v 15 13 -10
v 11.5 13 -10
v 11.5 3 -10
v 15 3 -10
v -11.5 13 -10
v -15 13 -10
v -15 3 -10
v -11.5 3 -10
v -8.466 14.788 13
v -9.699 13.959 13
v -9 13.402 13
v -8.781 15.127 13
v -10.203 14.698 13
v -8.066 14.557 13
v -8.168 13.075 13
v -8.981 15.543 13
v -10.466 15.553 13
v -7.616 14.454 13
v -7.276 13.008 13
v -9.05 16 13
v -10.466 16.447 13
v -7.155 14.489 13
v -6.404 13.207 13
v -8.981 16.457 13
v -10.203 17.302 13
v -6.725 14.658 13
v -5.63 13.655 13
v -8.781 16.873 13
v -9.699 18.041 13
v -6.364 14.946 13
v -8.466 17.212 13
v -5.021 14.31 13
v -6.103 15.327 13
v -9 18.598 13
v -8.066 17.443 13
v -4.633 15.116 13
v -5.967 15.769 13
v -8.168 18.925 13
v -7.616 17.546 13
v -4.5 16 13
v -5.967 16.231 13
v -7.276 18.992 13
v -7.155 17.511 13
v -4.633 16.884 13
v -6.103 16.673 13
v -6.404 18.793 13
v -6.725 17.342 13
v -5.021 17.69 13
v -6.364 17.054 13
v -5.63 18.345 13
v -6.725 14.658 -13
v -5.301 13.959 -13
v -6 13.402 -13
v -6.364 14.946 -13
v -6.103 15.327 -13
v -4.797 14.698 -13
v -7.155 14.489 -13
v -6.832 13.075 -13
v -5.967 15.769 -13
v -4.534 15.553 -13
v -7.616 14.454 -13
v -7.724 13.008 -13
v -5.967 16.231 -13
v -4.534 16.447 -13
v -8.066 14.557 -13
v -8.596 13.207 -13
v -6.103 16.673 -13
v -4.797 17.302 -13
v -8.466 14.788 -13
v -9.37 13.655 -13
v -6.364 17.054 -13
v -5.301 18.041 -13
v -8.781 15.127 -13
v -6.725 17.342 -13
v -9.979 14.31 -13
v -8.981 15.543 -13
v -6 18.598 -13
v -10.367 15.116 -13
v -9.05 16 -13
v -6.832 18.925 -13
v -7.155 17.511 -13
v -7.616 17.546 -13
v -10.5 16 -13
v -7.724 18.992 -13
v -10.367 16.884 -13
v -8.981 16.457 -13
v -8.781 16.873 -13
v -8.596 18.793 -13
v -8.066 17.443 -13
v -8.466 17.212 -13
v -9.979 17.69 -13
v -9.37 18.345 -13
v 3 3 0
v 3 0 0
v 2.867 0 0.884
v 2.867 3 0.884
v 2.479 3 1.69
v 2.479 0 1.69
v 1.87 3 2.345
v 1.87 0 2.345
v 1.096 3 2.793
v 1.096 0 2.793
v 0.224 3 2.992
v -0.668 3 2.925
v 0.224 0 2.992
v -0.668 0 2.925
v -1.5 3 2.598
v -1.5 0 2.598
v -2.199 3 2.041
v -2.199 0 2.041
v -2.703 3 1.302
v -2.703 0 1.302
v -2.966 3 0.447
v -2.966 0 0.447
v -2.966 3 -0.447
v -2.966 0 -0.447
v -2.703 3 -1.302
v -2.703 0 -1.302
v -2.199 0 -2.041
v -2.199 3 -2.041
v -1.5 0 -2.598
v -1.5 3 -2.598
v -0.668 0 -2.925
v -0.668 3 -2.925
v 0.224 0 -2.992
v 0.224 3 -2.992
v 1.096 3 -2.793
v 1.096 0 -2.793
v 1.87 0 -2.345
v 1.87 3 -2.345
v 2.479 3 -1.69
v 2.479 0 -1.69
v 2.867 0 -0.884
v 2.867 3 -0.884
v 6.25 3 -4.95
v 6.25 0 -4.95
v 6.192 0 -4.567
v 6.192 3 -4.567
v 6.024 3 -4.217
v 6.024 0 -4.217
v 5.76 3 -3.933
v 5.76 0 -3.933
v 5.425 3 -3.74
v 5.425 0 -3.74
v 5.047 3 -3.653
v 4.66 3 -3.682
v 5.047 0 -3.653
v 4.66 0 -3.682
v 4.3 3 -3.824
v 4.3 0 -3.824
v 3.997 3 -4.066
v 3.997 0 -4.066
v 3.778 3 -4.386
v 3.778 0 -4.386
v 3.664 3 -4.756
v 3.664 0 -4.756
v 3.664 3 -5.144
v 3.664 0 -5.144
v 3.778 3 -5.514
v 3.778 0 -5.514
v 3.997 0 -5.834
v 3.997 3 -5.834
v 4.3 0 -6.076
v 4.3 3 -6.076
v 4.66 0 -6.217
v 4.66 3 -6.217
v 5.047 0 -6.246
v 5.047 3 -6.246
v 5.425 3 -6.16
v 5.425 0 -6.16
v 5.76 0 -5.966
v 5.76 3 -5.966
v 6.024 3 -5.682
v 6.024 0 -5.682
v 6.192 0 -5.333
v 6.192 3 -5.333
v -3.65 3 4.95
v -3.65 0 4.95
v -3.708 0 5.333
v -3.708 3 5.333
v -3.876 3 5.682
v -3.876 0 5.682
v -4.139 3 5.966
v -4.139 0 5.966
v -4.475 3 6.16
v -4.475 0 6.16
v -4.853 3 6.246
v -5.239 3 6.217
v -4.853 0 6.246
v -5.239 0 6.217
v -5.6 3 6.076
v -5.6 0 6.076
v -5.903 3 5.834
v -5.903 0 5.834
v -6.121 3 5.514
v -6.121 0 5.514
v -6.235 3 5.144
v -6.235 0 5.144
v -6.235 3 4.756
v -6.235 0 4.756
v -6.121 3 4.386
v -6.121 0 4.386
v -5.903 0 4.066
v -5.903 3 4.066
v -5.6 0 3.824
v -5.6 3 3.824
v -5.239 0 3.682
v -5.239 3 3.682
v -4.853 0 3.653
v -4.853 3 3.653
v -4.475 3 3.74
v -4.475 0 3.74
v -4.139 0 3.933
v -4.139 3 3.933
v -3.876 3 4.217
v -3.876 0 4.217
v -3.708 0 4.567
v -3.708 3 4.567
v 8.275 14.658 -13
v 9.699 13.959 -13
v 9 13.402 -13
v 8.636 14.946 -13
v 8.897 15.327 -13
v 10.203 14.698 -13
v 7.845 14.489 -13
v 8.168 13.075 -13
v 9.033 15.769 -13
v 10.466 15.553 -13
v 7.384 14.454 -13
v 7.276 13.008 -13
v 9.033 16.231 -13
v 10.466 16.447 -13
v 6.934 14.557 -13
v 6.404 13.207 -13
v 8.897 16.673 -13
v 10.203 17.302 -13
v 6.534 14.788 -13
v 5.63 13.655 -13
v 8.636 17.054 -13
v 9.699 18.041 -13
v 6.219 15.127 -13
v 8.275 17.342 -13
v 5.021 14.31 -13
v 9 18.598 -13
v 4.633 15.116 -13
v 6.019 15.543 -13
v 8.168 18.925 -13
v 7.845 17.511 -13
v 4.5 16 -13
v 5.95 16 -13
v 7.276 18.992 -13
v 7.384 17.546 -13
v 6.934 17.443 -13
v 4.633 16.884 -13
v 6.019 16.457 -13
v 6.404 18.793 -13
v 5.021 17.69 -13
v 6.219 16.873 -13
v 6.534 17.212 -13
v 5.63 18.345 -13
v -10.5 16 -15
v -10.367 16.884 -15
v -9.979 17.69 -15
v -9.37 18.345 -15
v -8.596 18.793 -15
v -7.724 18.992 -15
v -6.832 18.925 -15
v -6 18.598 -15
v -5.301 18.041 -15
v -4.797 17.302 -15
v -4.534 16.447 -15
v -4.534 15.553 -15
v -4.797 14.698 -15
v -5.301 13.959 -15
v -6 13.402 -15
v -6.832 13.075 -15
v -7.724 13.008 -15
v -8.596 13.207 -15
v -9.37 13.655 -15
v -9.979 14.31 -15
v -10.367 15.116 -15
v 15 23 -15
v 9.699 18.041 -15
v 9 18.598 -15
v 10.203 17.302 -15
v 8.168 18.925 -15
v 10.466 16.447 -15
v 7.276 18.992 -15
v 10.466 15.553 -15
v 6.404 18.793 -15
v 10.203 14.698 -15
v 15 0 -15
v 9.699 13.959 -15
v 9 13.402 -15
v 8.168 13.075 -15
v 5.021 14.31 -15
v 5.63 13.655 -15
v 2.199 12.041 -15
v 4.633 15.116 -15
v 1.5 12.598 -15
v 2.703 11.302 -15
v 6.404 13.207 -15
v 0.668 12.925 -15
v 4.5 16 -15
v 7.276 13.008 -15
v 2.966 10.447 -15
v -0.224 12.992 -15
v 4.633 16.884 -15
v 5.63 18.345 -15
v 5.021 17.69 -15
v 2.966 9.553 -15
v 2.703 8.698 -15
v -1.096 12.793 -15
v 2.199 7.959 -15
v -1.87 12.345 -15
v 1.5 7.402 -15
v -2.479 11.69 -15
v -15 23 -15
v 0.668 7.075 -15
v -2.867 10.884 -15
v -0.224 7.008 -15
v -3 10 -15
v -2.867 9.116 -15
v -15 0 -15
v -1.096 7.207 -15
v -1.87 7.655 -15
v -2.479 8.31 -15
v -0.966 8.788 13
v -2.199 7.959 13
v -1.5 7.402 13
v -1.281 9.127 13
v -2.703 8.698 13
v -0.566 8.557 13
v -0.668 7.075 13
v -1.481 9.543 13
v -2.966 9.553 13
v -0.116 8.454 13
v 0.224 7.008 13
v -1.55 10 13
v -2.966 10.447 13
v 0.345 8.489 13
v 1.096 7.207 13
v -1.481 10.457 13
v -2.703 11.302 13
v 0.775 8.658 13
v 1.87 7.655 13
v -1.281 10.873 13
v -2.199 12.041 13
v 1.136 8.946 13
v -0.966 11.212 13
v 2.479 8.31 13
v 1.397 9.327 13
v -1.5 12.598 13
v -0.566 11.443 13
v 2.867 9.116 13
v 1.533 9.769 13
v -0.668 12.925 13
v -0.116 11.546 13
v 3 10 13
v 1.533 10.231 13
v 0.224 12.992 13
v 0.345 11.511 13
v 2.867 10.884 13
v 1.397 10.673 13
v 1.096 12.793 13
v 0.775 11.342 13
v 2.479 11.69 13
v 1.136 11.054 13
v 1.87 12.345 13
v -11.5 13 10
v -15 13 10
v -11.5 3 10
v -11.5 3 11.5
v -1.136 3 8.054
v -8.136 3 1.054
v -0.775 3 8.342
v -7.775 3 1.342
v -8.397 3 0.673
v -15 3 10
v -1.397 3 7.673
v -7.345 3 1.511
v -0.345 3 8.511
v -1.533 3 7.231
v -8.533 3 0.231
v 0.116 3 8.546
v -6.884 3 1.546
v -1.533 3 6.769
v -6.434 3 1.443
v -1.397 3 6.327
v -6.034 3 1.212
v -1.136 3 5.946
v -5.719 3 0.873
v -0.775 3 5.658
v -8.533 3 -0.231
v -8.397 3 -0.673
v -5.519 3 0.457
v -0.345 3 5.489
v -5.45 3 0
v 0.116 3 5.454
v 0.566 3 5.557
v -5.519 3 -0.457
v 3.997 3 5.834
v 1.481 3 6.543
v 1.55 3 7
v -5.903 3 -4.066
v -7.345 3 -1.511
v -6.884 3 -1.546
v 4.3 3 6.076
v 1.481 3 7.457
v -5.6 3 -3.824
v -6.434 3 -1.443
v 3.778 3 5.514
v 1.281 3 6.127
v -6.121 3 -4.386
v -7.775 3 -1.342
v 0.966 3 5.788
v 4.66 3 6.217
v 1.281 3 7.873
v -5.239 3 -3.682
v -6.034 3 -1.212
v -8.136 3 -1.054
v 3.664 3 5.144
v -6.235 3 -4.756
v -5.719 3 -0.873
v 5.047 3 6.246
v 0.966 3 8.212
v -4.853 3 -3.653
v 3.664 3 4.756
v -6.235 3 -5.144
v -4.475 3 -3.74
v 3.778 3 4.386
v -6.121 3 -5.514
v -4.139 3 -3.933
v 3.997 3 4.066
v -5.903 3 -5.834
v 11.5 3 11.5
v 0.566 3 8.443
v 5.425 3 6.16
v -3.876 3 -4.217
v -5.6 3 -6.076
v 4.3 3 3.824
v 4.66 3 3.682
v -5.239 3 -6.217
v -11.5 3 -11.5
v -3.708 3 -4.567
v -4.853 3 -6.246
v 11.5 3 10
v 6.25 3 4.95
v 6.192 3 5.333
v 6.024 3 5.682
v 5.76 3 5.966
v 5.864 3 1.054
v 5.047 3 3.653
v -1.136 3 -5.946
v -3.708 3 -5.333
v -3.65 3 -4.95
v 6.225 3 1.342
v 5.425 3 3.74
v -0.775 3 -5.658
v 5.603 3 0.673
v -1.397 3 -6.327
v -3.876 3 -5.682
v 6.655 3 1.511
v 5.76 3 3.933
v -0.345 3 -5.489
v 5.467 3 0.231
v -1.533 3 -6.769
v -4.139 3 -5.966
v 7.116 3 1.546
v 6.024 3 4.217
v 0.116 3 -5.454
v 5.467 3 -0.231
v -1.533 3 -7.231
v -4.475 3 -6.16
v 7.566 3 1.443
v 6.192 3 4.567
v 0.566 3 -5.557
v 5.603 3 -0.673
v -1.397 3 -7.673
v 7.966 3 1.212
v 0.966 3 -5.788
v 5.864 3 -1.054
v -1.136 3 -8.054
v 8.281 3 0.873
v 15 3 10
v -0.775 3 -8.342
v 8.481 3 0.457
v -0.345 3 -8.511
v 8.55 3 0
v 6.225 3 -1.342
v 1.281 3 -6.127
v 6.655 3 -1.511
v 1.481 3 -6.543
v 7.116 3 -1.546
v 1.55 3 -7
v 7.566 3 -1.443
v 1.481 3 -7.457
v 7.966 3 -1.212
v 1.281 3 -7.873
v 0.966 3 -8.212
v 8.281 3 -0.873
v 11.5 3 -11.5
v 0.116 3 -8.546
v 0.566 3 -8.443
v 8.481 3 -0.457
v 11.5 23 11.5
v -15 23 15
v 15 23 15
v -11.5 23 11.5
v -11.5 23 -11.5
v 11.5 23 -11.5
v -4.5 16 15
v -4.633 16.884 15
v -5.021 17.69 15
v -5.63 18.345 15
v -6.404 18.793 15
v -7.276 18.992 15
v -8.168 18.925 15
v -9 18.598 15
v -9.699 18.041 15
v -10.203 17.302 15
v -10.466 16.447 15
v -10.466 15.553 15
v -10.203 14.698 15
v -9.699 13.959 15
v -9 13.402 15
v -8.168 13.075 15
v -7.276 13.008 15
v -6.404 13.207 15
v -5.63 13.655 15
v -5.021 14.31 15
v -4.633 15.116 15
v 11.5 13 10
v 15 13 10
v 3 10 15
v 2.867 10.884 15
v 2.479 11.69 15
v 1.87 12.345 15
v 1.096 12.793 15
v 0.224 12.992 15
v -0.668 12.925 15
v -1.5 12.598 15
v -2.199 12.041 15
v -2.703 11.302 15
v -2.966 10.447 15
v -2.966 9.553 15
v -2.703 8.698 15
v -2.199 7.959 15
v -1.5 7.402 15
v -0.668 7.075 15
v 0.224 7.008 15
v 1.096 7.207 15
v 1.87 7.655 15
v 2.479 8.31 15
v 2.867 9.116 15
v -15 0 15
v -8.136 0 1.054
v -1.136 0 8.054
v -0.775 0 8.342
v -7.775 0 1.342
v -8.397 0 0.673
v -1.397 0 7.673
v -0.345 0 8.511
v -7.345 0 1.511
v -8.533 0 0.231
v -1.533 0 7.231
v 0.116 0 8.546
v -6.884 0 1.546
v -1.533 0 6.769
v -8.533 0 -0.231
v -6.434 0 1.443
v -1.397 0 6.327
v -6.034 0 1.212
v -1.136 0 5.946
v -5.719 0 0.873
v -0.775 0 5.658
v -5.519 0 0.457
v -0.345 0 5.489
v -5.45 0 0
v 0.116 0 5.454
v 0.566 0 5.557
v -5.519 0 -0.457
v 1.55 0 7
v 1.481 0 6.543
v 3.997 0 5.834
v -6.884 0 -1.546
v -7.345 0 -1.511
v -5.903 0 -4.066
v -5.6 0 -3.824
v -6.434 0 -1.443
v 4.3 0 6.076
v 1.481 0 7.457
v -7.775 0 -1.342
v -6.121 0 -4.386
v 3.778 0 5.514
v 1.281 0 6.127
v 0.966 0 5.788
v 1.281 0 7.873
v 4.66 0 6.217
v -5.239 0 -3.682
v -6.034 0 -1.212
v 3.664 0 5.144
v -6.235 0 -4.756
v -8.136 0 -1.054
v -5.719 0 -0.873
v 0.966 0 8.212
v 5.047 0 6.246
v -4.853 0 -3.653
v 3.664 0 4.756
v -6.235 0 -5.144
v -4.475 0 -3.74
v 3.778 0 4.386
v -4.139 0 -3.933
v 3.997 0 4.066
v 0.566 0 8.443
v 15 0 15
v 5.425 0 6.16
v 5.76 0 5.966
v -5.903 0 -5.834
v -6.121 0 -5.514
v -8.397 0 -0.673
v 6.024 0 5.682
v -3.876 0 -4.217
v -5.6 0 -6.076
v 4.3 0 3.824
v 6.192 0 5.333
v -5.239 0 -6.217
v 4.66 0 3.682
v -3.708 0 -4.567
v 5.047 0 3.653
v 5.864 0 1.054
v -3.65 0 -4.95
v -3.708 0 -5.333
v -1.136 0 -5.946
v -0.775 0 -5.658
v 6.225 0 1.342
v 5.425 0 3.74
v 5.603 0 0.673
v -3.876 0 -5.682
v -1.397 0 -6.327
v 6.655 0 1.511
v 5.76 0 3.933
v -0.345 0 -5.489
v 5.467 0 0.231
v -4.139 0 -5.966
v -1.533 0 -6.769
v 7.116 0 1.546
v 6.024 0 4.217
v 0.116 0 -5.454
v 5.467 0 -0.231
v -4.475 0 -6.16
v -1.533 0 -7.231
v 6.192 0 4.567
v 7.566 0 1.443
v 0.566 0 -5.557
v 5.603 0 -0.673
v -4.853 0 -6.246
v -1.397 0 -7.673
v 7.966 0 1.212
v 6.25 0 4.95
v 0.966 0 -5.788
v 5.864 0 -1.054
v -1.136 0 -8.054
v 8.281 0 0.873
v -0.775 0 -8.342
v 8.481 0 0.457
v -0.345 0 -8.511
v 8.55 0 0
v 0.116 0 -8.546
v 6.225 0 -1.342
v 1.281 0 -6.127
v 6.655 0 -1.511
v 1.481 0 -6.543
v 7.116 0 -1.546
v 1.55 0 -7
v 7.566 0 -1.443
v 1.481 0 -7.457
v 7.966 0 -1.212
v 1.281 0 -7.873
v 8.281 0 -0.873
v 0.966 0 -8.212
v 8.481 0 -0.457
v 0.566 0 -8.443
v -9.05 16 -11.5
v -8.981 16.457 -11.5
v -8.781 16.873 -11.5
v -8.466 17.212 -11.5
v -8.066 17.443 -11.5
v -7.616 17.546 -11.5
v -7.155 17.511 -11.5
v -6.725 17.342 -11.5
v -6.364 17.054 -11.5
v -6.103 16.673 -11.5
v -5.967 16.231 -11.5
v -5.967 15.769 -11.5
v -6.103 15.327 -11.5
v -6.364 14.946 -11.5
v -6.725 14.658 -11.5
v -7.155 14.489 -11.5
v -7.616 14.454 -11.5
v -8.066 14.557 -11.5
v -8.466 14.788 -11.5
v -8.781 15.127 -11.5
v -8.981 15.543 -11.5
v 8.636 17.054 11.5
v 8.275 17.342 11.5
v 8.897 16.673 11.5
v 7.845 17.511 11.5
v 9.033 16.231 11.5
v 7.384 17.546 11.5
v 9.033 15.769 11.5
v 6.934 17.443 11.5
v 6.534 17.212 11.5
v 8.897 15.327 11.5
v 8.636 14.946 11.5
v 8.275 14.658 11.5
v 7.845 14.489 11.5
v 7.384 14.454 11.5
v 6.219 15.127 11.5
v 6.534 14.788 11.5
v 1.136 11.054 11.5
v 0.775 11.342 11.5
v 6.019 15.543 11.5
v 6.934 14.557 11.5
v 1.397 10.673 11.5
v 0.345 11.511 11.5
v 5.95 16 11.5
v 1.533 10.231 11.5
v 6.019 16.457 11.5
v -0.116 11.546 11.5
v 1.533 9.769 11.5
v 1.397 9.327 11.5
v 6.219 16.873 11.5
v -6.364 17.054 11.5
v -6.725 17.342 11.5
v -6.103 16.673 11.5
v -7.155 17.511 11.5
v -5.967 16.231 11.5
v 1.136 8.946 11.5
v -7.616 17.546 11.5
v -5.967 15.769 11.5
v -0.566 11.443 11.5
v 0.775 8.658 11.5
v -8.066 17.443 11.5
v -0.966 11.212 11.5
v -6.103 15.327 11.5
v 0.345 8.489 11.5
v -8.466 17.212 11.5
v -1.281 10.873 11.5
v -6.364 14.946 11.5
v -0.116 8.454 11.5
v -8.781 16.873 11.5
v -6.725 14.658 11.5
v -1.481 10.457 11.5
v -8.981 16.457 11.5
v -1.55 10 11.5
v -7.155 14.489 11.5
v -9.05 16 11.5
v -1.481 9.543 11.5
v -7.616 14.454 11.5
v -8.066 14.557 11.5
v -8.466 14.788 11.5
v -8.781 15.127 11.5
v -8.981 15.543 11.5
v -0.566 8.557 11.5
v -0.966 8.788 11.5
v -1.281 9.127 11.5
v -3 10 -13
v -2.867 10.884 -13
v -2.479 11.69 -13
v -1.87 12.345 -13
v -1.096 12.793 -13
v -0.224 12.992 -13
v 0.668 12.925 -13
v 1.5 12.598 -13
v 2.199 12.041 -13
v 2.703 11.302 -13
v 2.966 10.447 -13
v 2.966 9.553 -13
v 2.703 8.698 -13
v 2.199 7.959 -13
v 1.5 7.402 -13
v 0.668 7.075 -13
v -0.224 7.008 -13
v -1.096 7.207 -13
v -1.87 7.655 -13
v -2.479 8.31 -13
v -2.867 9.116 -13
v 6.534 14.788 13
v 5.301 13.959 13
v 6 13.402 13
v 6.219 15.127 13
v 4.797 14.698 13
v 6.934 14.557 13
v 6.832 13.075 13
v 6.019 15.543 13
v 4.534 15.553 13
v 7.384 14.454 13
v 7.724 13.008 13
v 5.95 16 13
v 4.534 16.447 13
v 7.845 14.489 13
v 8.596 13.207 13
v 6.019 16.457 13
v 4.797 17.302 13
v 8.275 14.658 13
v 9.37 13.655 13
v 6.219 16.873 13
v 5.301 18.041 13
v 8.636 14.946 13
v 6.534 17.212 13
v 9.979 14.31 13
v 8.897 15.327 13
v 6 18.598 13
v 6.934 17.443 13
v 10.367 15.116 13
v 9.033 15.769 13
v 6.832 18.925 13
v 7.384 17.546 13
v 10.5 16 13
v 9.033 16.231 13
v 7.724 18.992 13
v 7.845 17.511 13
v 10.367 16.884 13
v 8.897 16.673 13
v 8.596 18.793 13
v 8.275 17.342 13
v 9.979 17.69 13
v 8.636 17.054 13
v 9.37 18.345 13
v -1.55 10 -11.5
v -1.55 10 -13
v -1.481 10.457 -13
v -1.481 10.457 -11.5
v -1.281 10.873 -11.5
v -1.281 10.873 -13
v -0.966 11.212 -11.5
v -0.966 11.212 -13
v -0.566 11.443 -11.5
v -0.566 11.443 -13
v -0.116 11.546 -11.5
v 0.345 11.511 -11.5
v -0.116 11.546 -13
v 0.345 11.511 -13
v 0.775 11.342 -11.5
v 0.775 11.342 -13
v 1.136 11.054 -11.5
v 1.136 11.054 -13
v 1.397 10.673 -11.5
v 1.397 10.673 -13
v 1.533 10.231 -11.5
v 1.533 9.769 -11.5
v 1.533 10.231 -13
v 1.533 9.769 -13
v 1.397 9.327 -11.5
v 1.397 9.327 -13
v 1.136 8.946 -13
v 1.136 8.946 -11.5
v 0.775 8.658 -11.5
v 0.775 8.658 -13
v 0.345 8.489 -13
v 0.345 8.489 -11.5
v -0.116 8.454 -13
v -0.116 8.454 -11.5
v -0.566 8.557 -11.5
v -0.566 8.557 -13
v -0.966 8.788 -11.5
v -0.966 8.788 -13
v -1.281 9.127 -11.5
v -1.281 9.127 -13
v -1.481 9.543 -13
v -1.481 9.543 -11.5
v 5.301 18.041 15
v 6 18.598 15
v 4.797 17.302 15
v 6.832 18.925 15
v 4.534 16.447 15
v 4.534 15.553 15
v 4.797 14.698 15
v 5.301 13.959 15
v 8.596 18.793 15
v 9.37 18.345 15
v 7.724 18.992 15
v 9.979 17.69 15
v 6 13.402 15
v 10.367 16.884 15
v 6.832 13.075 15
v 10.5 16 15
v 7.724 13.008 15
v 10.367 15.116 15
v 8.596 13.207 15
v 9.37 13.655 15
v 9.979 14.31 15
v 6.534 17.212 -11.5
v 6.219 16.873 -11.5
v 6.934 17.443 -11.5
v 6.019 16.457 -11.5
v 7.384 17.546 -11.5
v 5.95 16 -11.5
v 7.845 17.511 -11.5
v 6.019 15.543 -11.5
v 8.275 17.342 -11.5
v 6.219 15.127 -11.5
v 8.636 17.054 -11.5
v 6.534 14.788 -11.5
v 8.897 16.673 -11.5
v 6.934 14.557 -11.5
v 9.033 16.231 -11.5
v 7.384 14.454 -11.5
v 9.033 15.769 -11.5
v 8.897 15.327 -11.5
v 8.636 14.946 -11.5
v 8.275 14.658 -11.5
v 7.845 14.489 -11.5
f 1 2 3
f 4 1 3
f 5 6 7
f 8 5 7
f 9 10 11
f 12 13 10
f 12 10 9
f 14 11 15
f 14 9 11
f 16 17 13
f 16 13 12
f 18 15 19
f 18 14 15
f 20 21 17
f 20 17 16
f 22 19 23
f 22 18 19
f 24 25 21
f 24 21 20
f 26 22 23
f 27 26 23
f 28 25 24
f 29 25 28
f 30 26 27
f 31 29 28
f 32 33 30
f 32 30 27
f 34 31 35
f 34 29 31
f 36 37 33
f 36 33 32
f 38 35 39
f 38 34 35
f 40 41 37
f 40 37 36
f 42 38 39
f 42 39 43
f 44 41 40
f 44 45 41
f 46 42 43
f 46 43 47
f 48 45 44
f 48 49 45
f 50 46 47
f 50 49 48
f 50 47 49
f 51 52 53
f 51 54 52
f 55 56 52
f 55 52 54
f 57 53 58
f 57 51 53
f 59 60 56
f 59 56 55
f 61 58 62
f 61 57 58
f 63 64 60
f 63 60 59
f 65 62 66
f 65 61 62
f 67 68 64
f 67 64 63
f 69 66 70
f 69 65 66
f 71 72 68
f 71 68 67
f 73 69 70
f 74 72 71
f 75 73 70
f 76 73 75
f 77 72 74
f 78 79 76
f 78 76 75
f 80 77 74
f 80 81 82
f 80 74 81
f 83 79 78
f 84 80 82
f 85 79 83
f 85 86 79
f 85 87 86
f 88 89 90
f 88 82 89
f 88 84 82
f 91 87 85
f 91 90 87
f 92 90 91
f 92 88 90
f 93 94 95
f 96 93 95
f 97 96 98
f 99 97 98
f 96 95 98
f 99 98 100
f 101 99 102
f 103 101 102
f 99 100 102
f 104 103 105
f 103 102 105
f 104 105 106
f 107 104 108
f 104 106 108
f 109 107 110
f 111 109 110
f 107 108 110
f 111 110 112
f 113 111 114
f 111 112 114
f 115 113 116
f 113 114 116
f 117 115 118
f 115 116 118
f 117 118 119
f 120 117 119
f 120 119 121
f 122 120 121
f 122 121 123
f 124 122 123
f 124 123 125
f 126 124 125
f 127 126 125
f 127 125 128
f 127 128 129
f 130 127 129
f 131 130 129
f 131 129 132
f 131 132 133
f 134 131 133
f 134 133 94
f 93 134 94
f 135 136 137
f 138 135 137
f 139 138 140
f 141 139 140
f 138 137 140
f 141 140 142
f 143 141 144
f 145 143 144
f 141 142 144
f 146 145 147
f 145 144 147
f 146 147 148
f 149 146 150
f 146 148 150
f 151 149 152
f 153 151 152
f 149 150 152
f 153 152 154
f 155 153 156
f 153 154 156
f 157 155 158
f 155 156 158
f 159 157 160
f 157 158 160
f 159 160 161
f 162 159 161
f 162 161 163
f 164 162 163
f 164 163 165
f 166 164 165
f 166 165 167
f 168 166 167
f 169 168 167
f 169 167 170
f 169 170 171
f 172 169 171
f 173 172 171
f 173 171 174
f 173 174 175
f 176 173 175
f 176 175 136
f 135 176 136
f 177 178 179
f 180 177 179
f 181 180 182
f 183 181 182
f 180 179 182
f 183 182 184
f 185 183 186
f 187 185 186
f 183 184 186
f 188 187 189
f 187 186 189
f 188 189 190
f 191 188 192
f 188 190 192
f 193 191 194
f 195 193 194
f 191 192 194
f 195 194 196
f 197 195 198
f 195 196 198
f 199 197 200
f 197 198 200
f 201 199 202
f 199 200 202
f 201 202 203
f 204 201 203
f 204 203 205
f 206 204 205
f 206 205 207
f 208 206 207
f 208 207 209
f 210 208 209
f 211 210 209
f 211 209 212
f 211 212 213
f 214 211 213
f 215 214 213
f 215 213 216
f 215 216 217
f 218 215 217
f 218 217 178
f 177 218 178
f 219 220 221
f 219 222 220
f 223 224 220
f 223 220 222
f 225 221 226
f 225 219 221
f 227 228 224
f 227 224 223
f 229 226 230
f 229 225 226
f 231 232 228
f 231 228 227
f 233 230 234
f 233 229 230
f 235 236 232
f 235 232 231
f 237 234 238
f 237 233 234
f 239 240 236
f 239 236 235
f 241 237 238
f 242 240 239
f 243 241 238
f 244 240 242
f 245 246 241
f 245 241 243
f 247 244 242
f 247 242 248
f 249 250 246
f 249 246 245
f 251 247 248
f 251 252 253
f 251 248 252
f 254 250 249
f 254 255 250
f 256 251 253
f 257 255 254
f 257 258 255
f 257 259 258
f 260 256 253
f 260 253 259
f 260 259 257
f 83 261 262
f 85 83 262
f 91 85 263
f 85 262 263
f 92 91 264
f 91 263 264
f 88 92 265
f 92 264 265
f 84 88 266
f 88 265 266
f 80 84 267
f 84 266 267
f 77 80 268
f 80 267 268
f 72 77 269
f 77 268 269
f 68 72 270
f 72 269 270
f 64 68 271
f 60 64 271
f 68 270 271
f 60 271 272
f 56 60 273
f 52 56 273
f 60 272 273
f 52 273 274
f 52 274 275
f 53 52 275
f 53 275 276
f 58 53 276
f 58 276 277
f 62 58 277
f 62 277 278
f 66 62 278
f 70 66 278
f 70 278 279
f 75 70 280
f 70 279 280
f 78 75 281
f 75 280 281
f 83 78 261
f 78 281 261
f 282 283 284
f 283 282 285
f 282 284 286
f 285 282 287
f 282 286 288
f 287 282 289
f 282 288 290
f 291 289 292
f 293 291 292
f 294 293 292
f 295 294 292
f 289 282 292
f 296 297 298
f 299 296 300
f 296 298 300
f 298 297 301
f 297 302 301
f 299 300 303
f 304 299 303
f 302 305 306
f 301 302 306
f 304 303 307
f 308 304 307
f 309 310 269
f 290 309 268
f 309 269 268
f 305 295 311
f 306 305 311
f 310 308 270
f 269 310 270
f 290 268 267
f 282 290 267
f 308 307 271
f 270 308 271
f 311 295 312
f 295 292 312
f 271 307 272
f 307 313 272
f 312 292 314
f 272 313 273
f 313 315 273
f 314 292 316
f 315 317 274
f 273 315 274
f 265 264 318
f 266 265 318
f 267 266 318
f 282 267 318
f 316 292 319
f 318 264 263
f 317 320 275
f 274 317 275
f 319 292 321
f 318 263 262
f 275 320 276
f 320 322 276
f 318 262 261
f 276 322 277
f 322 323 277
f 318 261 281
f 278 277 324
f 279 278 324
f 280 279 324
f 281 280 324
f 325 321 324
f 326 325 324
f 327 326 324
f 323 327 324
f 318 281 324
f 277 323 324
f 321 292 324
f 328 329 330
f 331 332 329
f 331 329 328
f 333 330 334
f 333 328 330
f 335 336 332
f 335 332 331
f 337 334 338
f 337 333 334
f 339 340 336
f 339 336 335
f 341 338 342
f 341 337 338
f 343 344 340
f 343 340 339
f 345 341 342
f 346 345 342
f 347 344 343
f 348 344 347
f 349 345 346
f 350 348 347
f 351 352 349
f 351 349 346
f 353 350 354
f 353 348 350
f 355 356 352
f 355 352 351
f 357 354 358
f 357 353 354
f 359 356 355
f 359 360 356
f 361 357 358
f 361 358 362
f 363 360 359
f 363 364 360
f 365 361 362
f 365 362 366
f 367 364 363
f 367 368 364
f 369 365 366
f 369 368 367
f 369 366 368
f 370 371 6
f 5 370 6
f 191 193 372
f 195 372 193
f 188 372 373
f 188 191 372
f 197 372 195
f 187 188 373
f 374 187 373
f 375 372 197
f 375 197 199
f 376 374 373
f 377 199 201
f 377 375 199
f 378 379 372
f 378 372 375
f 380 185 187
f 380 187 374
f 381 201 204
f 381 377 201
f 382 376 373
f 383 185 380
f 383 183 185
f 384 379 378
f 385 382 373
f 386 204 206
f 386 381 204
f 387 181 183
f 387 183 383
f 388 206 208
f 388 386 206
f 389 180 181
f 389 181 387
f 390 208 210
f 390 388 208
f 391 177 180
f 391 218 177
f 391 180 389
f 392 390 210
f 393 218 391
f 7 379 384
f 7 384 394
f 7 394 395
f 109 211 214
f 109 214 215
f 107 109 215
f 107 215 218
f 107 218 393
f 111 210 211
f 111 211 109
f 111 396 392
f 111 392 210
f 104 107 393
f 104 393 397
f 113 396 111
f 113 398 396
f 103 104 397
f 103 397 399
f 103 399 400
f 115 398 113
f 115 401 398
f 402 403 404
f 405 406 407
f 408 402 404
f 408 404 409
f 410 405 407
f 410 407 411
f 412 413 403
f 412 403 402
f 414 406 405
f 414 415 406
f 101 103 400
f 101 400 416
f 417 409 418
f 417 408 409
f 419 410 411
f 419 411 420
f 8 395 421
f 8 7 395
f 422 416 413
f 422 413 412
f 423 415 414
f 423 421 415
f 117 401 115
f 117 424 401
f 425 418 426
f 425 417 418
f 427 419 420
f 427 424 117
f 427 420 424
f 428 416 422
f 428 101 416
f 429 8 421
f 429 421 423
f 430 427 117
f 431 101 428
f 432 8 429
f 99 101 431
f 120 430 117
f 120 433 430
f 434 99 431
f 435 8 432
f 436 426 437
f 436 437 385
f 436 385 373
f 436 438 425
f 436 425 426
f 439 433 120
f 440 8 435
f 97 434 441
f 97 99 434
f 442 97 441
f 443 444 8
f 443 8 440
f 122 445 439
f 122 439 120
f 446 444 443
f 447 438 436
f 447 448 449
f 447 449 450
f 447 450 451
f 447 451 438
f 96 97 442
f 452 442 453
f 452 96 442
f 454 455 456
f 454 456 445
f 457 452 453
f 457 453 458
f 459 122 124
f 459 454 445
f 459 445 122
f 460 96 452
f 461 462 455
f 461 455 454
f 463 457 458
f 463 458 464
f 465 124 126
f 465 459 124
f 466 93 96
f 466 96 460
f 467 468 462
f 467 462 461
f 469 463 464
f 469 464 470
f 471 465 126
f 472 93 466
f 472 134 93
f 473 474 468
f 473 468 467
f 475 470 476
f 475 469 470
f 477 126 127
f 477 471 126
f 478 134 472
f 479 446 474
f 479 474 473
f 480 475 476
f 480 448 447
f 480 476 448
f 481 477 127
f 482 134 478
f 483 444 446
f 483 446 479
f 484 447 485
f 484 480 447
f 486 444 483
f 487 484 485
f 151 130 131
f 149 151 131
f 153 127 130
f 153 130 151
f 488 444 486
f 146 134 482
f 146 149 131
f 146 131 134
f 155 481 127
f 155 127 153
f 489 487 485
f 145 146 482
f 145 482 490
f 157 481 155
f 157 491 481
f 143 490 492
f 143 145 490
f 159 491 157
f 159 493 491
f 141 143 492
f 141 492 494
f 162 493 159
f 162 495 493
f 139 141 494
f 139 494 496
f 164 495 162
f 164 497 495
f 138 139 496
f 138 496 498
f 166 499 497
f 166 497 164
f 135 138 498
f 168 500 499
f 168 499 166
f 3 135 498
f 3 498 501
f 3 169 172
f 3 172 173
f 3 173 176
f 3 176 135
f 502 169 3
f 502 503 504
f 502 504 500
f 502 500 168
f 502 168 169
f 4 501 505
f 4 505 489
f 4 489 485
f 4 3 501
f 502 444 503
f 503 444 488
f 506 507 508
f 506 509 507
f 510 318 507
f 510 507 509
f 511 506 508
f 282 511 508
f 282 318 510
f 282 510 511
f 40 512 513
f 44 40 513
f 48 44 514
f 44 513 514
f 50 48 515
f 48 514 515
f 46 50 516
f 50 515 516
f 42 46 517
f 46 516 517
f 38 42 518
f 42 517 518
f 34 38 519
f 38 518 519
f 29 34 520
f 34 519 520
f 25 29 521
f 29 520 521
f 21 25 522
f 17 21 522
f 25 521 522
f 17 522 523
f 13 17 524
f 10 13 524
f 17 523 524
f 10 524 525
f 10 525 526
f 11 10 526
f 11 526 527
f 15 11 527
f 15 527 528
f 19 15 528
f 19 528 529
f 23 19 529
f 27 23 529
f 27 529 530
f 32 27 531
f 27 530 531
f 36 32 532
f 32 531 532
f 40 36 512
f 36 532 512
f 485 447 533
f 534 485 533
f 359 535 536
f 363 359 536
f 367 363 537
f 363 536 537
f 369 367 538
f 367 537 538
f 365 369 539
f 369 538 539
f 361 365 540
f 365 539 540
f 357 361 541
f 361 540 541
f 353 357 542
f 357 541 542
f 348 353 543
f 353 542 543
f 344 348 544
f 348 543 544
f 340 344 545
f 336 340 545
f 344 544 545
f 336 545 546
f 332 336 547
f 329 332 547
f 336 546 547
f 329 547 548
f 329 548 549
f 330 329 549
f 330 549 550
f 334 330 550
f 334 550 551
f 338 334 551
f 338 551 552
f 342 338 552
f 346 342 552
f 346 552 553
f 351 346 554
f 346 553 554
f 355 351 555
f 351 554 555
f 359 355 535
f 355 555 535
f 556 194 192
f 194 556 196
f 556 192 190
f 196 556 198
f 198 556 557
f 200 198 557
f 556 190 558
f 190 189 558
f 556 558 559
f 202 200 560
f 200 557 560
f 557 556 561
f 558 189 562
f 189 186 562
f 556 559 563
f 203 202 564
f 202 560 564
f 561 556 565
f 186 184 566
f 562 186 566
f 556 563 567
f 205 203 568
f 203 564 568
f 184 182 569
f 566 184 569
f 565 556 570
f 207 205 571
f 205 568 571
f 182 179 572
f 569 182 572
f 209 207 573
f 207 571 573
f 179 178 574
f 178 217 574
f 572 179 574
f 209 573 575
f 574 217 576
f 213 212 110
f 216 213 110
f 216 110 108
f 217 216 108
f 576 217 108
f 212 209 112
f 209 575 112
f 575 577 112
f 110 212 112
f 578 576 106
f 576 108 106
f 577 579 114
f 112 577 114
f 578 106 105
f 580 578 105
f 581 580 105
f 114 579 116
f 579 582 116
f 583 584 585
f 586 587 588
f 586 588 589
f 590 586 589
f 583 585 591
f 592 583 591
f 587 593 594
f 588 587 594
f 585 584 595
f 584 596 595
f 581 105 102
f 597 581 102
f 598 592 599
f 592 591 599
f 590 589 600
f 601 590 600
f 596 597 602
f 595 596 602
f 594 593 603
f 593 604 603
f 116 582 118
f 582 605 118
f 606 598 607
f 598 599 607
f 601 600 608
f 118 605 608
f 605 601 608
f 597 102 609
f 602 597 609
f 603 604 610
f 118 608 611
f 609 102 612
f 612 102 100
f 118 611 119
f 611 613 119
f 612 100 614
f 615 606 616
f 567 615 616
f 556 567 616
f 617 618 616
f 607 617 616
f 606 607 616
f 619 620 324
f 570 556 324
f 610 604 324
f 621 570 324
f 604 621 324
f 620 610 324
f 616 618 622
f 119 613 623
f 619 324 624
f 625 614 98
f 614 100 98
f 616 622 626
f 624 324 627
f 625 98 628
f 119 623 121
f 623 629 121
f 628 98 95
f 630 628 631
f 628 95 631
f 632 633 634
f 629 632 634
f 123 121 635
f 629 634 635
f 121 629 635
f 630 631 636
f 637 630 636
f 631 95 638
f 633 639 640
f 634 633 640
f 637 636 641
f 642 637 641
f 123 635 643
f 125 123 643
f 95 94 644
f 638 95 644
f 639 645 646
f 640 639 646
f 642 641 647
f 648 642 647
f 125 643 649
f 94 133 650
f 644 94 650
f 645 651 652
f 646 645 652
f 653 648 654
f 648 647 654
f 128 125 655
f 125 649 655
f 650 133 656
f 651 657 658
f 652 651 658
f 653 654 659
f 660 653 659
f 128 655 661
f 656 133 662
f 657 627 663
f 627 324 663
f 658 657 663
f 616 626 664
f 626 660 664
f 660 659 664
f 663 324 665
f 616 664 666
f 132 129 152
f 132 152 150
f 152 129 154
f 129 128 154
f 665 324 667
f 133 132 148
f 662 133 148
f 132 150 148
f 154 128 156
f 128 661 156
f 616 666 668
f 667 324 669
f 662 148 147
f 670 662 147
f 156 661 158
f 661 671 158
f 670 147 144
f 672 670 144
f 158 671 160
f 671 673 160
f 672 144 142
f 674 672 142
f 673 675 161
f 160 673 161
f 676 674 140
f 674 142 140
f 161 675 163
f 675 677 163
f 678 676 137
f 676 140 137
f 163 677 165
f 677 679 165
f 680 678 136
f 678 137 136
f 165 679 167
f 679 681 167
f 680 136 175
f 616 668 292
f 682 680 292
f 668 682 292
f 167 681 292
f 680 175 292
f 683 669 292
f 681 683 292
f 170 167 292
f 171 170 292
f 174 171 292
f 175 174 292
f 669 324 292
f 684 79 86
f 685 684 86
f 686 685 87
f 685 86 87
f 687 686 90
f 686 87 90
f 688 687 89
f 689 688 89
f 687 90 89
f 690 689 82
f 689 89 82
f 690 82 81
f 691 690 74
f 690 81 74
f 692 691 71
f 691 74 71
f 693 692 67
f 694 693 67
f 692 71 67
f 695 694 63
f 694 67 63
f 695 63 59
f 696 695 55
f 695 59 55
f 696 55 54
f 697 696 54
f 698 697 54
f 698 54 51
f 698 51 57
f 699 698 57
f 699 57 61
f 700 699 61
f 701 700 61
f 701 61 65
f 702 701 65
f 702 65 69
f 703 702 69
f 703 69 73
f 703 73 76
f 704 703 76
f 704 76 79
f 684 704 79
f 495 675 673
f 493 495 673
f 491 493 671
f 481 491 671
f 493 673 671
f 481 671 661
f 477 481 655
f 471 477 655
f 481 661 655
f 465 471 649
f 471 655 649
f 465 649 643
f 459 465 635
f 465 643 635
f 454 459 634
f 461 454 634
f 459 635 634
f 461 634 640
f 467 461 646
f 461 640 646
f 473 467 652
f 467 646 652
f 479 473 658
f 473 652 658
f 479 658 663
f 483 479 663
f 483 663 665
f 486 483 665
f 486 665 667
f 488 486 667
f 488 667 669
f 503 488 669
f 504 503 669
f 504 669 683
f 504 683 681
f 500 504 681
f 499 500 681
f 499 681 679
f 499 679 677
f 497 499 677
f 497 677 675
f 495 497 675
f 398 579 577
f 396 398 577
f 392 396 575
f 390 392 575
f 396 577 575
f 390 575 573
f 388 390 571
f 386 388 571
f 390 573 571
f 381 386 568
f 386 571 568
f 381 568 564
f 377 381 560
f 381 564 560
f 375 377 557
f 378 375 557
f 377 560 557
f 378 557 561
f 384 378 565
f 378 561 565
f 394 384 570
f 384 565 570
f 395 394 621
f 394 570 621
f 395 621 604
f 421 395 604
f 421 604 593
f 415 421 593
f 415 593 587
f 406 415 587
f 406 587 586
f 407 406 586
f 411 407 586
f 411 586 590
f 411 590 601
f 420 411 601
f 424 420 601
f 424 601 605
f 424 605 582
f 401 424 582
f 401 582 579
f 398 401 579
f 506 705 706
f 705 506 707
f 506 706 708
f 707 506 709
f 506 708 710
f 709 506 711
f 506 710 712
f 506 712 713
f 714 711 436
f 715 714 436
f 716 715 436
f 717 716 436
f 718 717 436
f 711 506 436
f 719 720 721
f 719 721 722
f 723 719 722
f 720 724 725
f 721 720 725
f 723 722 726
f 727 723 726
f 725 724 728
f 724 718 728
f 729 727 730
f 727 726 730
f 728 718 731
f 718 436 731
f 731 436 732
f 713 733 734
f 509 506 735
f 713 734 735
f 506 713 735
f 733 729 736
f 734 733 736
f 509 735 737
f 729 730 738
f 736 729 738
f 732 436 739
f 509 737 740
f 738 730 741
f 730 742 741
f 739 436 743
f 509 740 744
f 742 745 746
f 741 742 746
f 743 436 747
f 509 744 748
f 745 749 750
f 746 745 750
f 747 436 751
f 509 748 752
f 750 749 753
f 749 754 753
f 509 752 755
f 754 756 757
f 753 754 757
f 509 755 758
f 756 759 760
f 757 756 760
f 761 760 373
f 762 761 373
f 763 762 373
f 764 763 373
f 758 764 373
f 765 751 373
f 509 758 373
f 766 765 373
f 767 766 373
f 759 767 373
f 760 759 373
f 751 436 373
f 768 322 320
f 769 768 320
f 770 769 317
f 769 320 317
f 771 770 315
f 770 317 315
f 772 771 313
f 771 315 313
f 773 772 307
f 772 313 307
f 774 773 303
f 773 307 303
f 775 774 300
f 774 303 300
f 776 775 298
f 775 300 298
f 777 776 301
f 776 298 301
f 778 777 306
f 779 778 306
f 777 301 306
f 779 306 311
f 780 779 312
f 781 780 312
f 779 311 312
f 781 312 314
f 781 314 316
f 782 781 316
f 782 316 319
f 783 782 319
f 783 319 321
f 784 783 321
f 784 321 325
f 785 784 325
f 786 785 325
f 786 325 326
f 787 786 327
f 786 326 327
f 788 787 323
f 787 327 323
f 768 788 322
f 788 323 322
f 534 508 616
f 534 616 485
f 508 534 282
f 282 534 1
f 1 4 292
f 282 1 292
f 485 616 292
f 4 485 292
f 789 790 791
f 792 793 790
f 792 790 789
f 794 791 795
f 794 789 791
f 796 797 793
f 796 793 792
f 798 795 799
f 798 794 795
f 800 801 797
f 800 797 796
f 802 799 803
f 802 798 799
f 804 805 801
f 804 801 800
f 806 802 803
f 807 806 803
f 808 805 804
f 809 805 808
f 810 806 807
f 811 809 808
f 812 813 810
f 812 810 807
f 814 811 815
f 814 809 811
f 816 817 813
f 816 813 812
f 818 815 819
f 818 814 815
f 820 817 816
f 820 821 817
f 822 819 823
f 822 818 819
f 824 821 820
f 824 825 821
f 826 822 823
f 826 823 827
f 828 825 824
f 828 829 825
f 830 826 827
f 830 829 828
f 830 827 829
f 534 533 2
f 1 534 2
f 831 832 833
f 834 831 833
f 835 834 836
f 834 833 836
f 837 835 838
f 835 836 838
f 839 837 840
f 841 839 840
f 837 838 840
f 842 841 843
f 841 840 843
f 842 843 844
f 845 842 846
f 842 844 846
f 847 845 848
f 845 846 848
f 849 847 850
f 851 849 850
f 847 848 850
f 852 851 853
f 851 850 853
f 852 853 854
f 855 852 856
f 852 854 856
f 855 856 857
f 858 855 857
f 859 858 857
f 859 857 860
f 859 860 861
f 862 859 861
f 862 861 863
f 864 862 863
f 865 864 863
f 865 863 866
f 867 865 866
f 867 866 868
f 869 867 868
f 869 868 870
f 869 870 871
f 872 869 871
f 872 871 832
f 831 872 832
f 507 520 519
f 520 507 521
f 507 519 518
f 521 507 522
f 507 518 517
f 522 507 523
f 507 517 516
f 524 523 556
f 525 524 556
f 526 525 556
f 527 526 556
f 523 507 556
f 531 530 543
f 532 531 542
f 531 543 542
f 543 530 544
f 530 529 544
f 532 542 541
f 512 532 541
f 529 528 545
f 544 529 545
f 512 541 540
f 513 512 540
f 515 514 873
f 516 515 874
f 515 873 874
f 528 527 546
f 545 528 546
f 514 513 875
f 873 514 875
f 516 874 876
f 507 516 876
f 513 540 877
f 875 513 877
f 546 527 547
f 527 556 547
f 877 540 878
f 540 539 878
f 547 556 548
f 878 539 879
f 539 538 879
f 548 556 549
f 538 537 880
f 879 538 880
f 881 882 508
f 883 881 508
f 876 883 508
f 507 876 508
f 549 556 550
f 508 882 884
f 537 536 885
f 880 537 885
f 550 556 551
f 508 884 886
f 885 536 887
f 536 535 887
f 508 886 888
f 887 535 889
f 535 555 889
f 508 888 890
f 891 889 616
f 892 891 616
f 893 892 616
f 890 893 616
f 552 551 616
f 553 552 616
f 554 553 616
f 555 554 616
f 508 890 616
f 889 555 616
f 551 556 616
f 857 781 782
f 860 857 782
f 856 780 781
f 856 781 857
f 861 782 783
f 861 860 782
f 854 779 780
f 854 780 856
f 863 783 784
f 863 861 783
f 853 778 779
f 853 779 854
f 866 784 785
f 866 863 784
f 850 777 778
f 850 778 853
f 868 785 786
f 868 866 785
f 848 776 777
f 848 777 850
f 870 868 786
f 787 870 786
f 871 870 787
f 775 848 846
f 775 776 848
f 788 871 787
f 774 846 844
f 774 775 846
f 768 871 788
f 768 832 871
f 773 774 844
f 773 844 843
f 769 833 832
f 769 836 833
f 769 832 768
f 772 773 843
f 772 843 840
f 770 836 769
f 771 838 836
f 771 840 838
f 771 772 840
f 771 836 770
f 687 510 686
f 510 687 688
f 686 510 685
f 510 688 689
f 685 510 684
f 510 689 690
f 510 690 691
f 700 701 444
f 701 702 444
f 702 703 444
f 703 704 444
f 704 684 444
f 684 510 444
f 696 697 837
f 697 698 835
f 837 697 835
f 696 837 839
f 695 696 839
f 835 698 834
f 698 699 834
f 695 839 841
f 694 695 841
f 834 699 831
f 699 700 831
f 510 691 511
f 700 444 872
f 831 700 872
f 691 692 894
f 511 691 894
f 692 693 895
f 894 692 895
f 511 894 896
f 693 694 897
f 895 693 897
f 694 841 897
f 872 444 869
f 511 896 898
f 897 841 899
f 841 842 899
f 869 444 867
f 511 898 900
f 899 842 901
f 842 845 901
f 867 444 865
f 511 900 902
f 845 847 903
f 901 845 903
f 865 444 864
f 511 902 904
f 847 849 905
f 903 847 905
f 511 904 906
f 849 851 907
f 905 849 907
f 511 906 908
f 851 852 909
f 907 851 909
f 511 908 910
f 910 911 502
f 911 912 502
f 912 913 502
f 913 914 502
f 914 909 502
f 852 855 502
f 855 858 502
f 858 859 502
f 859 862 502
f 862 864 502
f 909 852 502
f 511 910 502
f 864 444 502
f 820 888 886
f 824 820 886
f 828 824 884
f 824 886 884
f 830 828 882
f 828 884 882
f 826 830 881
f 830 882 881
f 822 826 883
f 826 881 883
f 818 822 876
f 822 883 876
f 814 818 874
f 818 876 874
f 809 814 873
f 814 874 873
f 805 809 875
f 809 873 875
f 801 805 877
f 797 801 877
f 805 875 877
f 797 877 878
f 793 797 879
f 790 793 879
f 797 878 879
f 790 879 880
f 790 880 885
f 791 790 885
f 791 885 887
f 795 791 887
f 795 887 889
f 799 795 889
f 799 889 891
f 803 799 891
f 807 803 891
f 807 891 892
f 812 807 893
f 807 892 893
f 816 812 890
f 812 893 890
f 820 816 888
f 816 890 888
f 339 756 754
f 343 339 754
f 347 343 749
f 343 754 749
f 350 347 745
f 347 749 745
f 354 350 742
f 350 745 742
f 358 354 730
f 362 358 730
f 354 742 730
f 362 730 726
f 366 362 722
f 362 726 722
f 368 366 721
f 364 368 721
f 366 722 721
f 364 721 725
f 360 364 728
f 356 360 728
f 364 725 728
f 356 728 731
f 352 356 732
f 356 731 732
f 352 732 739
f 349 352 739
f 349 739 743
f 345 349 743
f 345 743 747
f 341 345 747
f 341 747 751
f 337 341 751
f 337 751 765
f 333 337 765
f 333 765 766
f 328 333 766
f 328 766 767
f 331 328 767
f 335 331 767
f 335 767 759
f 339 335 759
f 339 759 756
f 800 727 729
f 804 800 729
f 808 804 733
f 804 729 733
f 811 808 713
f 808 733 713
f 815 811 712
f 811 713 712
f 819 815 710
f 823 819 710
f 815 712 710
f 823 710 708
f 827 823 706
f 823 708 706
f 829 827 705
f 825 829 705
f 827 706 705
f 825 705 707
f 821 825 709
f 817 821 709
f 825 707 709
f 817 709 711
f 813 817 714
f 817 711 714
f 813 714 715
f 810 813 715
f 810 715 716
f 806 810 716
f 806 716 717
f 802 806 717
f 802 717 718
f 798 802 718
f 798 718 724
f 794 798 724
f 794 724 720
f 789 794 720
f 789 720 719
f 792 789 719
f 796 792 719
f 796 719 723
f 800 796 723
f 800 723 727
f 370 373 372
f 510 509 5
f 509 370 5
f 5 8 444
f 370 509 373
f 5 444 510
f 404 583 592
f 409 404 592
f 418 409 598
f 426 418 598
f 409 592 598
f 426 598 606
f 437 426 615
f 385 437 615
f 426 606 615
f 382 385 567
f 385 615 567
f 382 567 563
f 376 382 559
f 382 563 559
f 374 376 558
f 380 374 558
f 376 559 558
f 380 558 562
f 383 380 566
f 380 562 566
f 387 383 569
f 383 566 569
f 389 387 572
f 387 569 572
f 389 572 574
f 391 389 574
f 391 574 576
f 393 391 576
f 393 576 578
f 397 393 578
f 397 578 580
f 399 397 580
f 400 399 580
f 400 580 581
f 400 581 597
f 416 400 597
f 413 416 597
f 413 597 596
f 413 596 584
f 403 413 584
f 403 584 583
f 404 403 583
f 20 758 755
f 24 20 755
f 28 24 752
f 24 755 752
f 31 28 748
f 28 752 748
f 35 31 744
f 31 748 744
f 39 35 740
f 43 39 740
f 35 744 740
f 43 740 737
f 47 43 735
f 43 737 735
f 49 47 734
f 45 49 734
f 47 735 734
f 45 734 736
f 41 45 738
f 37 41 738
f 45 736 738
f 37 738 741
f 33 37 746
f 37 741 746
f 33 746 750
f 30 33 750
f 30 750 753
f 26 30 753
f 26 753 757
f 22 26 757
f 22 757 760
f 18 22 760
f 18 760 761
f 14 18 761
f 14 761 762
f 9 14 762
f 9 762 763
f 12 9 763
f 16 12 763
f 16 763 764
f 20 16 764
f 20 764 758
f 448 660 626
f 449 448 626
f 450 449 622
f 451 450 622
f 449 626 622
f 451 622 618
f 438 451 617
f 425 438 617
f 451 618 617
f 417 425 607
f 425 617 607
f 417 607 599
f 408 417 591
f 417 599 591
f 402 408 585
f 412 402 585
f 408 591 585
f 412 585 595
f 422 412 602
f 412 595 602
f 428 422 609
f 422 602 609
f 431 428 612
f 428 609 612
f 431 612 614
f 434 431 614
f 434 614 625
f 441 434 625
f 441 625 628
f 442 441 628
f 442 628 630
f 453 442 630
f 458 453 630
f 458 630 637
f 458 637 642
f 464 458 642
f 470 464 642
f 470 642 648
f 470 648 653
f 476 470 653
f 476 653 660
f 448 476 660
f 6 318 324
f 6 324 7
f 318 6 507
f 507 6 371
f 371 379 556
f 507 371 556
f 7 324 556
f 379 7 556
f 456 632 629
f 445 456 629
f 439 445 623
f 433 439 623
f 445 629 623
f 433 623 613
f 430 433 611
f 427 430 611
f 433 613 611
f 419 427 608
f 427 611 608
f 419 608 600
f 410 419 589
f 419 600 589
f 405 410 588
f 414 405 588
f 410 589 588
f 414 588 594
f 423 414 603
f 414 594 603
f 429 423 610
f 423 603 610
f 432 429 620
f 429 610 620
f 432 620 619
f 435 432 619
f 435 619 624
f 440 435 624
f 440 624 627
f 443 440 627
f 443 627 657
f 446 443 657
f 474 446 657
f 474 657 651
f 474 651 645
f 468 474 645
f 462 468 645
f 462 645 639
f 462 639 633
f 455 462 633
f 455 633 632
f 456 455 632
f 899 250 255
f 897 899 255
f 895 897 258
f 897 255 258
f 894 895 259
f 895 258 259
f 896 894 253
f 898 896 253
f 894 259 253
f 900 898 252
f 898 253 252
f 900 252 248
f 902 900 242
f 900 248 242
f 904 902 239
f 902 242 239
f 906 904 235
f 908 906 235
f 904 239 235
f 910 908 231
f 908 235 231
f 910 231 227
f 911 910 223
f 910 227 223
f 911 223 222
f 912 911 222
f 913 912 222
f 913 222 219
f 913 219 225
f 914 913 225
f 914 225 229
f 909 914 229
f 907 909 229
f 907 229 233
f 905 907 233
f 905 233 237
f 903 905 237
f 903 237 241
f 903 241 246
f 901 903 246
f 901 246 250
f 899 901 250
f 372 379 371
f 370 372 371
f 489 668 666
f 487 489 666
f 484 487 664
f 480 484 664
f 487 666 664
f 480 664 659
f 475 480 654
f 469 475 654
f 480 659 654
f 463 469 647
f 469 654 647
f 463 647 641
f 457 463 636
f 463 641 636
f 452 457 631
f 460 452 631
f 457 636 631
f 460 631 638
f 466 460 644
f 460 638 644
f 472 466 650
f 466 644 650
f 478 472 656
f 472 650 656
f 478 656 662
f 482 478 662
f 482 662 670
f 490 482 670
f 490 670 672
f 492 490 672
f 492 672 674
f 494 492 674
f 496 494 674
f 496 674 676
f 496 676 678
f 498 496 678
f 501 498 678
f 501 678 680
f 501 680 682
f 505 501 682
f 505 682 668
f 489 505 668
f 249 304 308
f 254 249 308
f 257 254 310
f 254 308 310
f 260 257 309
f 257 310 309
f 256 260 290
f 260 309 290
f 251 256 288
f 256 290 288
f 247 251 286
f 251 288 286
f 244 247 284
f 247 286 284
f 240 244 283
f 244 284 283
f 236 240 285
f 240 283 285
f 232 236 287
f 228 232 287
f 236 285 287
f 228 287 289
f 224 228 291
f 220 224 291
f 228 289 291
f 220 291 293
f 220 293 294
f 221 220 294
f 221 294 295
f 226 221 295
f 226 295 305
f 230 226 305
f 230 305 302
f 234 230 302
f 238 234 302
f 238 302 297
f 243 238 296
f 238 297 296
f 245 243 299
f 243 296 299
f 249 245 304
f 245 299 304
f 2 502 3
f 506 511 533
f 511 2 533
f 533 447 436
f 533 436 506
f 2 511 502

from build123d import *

# Parameters (mm, degrees)
SKETCH_1_W          = 23
SKETCH_1_H          = 30
EXTRUDE_2_DEPTH     = 3
SKETCH_1_4_W        = 23
SKETCH_1_4_H        = 3.5
EXTRUDE_3_DEPTH     = 18
EXTRUDE_3_2_DEPTH   = 18
SKETCH_1_5_W        = 30
SKETCH_1_5_H        = 30
SKETCH_1_5_W_2      = 23
SKETCH_1_5_H_2      = 23
EXTRUDE_4_DEPTH     = 23
SKETCH_3_R          = 1.55
CUT_EXTRUDE_2_DEPTH = 45.171936792
CUT_EXTRUDE_5_DEPTH = 41.669398815
SKETCH_9_R          = 1.3
SKETCH_9_R_2        = 3
SKETCH_9_R_3        = 1.55
CUT_EXTRUDE_6_DEPTH = 32.288975694
SKETCH_10_R         = 3
CUT_EXTRUDE_7_DEPTH = 2
CUT_EXTRUDE_START   = -2
SKETCH_11_R         = 3
CUT_EXTRUDE_8_DEPTH = 2


with BuildPart() as part:
    # 草图1 → 凸台-拉伸2 (new body)
    with BuildSketch(Plane(origin=(0, 0, 0), x_dir=(1, 0, 0), z_dir=(0, 1, 0))):
        Rectangle(SKETCH_1_W, SKETCH_1_H)
    extrude(amount=EXTRUDE_2_DEPTH)



with BuildPart() as body_2:
    # 草图1<4> → 凸台-拉伸3 (new body)
    with BuildSketch(Plane(origin=(0, 0, 0), x_dir=(1, 0, 0), z_dir=(0, 1, 0))):
        with Locations((0, 13.25)):
            Rectangle(SKETCH_1_4_W, SKETCH_1_4_H)
    extrude(amount=EXTRUDE_3_DEPTH)


with BuildPart() as body_3:
    # 草图1<4> → Extrude 3 2 (new body)
    with BuildSketch(Plane(origin=(0, 0, 0), x_dir=(1, 0, 0), z_dir=(0, 1, 0))):
        with Locations((0, -13.25)):
            Rectangle(SKETCH_1_4_W, SKETCH_1_4_H)
    extrude(amount=EXTRUDE_3_2_DEPTH)


with BuildPart() as part_1:
    add(part.part)

    add(body_2.part)  # 凸台-拉伸4 merges body 2

    add(body_3.part)  # 凸台-拉伸4 merges body 3
    # 草图1<5> → 凸台-拉伸4 (add)
    with BuildSketch(Plane(origin=(0, 0, 0), x_dir=(1, 0, 0), z_dir=(0, 1, 0))):
        Rectangle(SKETCH_1_5_W, SKETCH_1_5_H)
        Rectangle(SKETCH_1_5_W_2, SKETCH_1_5_H_2, mode=Mode.SUBTRACT)
    extrude(amount=EXTRUDE_4_DEPTH)

    # 草图3 → 切除-拉伸2 (cut, through all)
    with BuildSketch(Plane(origin=(0, 0, -19.6), x_dir=(-1, 0, 0), z_dir=(0, 0, -1))):
        with Locations((0, 10)):
            Circle(SKETCH_3_R)
        with Locations((-7.5, 16)):
            Circle(SKETCH_3_R)
        with Locations((7.5, 16)):
            Circle(SKETCH_3_R)
    extrude(amount=-CUT_EXTRUDE_2_DEPTH, mode=Mode.SUBTRACT)

    # 草图8 → 切除-拉伸5 (cut, through all)
    with BuildSketch(Plane.ZY.offset(15)):
        Polygon((10, 3), (10, 10), (10, 13), (-10, 13), (-10, 3), (0, 3), align=None)
    extrude(amount=-CUT_EXTRUDE_5_DEPTH, mode=Mode.SUBTRACT)

    # 草图9 → 切除-拉伸6 (cut, through all)
    with BuildSketch(Plane.XZ):
        with Locations((-4.949747468, -4.949747468)):
            Circle(SKETCH_9_R)
        with Locations((4.949747468, -4.949747468)):
            Circle(SKETCH_9_R)
        with Locations((4.949747468, 4.949747468)):
            Circle(SKETCH_9_R)
        with Locations((-4.949747468, 4.949747468)):
            Circle(SKETCH_9_R)
        Circle(SKETCH_9_R_2)
        with Locations((7, 0)):
            Circle(SKETCH_9_R_3)
        with Locations((0, 7)):
            Circle(SKETCH_9_R_3)
        with Locations((0, -7)):
            Circle(SKETCH_9_R_3)
        with Locations((-7, 0)):
            Circle(SKETCH_9_R_3)
    extrude(amount=-CUT_EXTRUDE_6_DEPTH, mode=Mode.SUBTRACT)

    # 草图10 → 切除-拉伸7 (cut)
    with BuildSketch(Plane(origin=(0, 0, -15), x_dir=(-1, 0, 0), z_dir=(0, 0, -1))):
        with Locations((7.5, 16)):
            Circle(SKETCH_10_R)
        with Locations((0, 10)):
            Circle(SKETCH_10_R)
        with Locations((-7.5, 16)):
            Circle(SKETCH_10_R)
    extrude(amount=-CUT_EXTRUDE_7_DEPTH, mode=Mode.SUBTRACT)

    # 草图11 → 切除-拉伸8 (cut)
    with BuildSketch(Plane.XY.offset(15).offset(CUT_EXTRUDE_START)):
        with Locations((-7.5, 16)):
            Circle(SKETCH_11_R)
        with Locations((0, 10)):
            Circle(SKETCH_11_R)
        with Locations((7.5, 16)):
            Circle(SKETCH_11_R)
    extrude(amount=CUT_EXTRUDE_8_DEPTH, mode=Mode.SUBTRACT)


solid = part_1.part
